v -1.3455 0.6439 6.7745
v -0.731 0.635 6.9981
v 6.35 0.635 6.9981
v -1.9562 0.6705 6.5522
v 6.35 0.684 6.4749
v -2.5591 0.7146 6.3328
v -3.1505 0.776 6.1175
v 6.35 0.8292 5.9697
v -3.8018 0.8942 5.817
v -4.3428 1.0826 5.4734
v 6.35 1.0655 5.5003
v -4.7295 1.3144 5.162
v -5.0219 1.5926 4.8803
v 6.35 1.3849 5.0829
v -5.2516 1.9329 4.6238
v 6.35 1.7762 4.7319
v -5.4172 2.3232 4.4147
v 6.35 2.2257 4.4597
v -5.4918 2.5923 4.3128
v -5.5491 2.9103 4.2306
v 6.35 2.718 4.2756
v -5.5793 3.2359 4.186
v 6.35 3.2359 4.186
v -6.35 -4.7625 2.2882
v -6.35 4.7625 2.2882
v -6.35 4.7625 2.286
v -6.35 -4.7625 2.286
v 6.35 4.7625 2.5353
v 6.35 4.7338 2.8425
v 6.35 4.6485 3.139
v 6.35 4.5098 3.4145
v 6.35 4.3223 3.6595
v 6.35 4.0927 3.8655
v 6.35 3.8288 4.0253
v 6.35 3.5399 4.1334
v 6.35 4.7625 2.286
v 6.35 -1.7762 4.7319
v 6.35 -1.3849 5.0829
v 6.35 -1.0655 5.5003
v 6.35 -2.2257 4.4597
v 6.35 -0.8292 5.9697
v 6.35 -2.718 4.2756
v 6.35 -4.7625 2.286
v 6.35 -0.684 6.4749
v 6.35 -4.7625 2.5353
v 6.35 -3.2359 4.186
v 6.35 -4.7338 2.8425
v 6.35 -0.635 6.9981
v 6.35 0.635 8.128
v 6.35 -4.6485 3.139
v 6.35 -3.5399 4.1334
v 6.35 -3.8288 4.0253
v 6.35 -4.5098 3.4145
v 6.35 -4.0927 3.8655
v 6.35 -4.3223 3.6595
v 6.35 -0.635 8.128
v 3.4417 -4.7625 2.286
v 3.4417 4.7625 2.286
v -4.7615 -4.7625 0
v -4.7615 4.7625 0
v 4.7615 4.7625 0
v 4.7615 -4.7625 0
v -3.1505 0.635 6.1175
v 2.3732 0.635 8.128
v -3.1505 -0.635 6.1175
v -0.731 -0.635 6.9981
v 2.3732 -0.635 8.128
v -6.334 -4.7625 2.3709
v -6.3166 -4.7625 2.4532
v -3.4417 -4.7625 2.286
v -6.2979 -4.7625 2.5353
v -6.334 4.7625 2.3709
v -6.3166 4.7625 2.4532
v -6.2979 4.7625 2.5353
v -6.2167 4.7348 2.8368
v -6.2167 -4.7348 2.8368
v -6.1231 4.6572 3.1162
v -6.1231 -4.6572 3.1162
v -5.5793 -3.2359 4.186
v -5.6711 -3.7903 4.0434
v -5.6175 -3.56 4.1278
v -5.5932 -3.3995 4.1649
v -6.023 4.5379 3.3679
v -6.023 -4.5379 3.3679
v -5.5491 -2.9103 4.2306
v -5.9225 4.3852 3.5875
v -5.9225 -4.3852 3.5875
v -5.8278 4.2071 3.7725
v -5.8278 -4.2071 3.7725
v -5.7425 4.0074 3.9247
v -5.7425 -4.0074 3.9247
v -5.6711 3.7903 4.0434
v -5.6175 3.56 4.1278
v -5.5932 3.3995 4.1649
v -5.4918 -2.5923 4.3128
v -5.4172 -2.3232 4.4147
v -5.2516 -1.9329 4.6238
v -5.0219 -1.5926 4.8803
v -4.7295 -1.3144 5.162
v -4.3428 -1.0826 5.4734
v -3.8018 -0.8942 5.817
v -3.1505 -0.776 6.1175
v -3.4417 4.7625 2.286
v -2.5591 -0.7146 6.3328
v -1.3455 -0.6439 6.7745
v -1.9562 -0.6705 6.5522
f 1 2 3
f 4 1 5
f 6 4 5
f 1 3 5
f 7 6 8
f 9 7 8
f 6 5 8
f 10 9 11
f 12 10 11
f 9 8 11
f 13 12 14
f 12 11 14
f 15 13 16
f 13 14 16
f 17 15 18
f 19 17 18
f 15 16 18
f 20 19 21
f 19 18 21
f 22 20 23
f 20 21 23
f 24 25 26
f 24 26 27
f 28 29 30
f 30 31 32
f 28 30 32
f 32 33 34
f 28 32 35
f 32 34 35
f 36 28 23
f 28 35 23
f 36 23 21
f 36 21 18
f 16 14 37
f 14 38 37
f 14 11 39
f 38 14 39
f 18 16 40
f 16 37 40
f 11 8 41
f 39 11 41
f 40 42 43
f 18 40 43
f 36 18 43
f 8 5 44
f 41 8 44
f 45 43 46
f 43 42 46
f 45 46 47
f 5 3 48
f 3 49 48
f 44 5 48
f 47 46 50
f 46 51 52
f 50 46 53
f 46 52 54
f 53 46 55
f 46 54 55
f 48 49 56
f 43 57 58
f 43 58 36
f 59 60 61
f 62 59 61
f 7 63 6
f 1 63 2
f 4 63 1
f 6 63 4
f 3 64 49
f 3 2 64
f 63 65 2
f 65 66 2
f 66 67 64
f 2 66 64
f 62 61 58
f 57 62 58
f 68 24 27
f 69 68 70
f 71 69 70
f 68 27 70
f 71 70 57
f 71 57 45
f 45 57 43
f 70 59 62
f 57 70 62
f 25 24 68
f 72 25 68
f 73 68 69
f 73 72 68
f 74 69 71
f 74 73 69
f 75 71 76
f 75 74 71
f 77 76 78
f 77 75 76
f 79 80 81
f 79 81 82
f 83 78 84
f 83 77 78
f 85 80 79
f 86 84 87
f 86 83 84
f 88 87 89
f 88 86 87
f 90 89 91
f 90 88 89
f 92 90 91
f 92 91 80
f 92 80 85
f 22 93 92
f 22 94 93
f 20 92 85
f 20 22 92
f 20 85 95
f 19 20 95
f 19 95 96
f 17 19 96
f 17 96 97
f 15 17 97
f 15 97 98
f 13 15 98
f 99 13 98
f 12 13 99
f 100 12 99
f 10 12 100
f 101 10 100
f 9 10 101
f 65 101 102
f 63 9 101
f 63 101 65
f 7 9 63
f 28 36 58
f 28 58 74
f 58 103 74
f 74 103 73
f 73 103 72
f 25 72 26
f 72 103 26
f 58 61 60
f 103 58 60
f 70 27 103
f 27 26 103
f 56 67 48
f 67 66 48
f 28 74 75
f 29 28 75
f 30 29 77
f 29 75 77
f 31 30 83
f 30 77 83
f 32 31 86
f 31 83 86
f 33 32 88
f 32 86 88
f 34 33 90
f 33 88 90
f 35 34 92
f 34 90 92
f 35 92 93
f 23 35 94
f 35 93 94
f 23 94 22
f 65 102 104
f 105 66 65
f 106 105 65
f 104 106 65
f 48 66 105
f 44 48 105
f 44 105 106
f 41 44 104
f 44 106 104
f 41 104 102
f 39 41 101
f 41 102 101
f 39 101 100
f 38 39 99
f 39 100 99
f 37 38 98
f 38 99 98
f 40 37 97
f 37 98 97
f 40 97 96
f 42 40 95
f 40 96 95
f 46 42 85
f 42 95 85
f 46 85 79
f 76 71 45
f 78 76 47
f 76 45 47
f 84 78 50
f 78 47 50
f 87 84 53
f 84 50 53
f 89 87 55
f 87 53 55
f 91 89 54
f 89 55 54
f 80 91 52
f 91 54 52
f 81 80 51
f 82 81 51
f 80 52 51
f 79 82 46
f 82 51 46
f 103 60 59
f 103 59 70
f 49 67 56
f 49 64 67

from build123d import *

# Parameters (mm, degrees)
F0_W         = 9.525
F0_H         = 9.525
F1_DEPTH     = 2.286
F2_T1_DEPTH  = 21.3619144247
F3_W         = 2.9083
F3_H         = 9.525
F3_W_2       = 6.8834
F4_DEPTH     = 1.905
F5_R         = 1.6556676611
F6_W         = 12.7
F6_H         = 1.27
F7_DEPTH     = 3.937
F8_SIZE2     = 8.7232408068
F8_SIZE      = 3.175
F9_T4_DEPTH  = 12.7
F9_T9_DEPTH  = 12.7
F10_T1_DEPTH = 20.3689561099


# Not quite as in the source:
# - a fillet or chamfer that OpenCascade refuses, or shapes differently, is made with other operations: its cross-section is extruded or revolved along the edge and cut away or added


with BuildPart() as f1:
    # F0 (on Top) → F1 (new body)
    with BuildSketch(Plane.XY):
        Rectangle(F0_W, F0_H)
    extrude(amount=F1_DEPTH)

    # F2: chamfer of 1.3208 x 2.2876927066 on 2 edges, made by hand

    # F2_s2 → F2_t1 (cut)
    with BuildSketch(Plane.XZ.offset(-10.6809572123)):
        Polygon((-4.7625, -0.0016927066), (-3.4417, 2.286), (-4.7625, 2.286), align=None)
        Polygon((4.7625, -0.0016927066), (3.4417, 2.286), (4.7625, 2.286), align=None)
    extrude(amount=F2_T1_DEPTH, mode=Mode.SUBTRACT)

    # F3 (on face) → F4 (join)
    with BuildSketch(Plane.XY.offset(2.286)):
        with Locations((4.89585, 0)):
            Rectangle(F3_W, F3_H)
        Rectangle(F3_W_2, F3_H)
        with Locations((-4.89585, 0)):
            Rectangle(F3_W, F3_H)
    extrude(amount=F4_DEPTH)

    # F5
    f5_edges = [f1.edges().sort_by_distance(p)[0] for p in [
        (0, 4.7625, 4.191),
        (0, -4.7625, 4.191),
    ]]
    fillet(f5_edges, radius=F5_R)

    # F6 (on face) → F7 (join)
    with BuildSketch(Plane.XY.offset(4.191)):
        Rectangle(F6_W, F6_H)
    extrude(amount=F7_DEPTH)

    # F8
    f8_edges = [f1.edges().sort_by_distance(p)[0] for p in [
        (-6.35, 0, 8.128),
    ]]
    f8_side = f1.faces().sort_by_distance((-6.35, 0, 3.872106))[0]
    chamfer(f8_edges, length=F8_SIZE, length2=F8_SIZE2, reference=f8_side)

    # F9: fillet of radius 2.8207671263 on 2 edges, made by hand


with BuildPart() as f9_tool2:
    # F9_s3 → F9_t4 (new body)
    with BuildSketch(Plane.YZ.offset(-6.35)):
        with BuildLine():
            ThreePointArc((-0.635, 6.9981468006), (-1.3849039981, 5.0828783899), (-3.235890411, 4.1859623453))
            Line((-3.235890411, 4.1859623453), (-3.2139027394, 3.9047438998))
            ThreePointArc((-3.2139027394, 3.9047438998), (-3.1068323389, 3.9089232874), (-0.635, 3.9089232874))
            Line((-0.635, 3.9089232874), (-0.3529232874, 4.191))
            Line((-0.3529232874, 4.191), (-0.3529232874, 6.9981468006))
            Line((-0.3529232874, 6.9981468006), (-0.635, 6.9981468006))
        make_face()
    extrude(amount=F9_T4_DEPTH)

    split(bisect_by=Plane(origin=(-2.3346724085, 0, 6.4144597241), x_dir=(0, 1, 0), z_dir=(0.3420201433, 0, -0.9396926208)), keep=Keep.TOP)


with BuildPart() as f1_1:
    add(f1.part)

    # F9_t1: union F9_tool2
    add(f9_tool2.part)


with BuildPart() as f9_tool7:
    # F9_s8 → F9_t9 (new body)
    with BuildSketch(Plane.YZ.offset(6.35)):
        with BuildLine():
            ThreePointArc((0.635, 6.9981468006), (1.3849039981, 5.0828783899), (3.235890411, 4.1859623453))
            Line((3.235890411, 4.1859623453), (3.2139027394, 3.9047438998))
            ThreePointArc((3.2139027394, 3.9047438998), (3.1068323389, 3.9089232874), (0.635, 3.9089232874))
            Line((0.635, 3.9089232874), (0.3529232874, 4.191))
            Line((0.3529232874, 4.191), (0.3529232874, 6.9981468006))
            Line((0.3529232874, 6.9981468006), (0.635, 6.9981468006))
        make_face()
    extrude(amount=-F9_T9_DEPTH)

    split(bisect_by=Plane(origin=(-2.3346724085, 0, 6.4144597241), x_dir=(0, 1, 0), z_dir=(0.3420201433, 0, -0.9396926208)), keep=Keep.TOP)


with BuildPart() as f1_2:
    add(f1_1.part)

    # F9_t6: union F9_tool7
    add(f9_tool7.part)

    # F10: fillet of radius 5.08 on 1 edges, made by hand

    # F10_s2 → F10_t1 (cut)
    with BuildSketch(Plane.XZ.offset(-10.184478055)):
        with BuildLine():
            ThreePointArc((-6.3503933611, 2.2860725742), (-5.2327762913, 4.646139378), (-3.0907506998, 6.1396954024))
            Line((-3.0907506998, 6.1396954024), (-3.2645725807, 6.6172670953))
            ThreePointArc((-3.2645725807, 6.6172670953), (-4.8941288268, 6.0237314555), (-6.5238218809, 5.4305716928))
            Line((-6.5238218809, 5.4305716928), (-6.8582211803, 4.953))
            ThreePointArc((-6.8582211803, 4.953), (-6.8582211803, 3.6195362871), (-6.8501795082, 2.3782819842))
            Line((-6.8501795082, 2.3782819842), (-6.3503933611, 2.2860725742))
        make_face()
    extrude(amount=F10_T1_DEPTH, mode=Mode.SUBTRACT)


solid = f1_2.part
